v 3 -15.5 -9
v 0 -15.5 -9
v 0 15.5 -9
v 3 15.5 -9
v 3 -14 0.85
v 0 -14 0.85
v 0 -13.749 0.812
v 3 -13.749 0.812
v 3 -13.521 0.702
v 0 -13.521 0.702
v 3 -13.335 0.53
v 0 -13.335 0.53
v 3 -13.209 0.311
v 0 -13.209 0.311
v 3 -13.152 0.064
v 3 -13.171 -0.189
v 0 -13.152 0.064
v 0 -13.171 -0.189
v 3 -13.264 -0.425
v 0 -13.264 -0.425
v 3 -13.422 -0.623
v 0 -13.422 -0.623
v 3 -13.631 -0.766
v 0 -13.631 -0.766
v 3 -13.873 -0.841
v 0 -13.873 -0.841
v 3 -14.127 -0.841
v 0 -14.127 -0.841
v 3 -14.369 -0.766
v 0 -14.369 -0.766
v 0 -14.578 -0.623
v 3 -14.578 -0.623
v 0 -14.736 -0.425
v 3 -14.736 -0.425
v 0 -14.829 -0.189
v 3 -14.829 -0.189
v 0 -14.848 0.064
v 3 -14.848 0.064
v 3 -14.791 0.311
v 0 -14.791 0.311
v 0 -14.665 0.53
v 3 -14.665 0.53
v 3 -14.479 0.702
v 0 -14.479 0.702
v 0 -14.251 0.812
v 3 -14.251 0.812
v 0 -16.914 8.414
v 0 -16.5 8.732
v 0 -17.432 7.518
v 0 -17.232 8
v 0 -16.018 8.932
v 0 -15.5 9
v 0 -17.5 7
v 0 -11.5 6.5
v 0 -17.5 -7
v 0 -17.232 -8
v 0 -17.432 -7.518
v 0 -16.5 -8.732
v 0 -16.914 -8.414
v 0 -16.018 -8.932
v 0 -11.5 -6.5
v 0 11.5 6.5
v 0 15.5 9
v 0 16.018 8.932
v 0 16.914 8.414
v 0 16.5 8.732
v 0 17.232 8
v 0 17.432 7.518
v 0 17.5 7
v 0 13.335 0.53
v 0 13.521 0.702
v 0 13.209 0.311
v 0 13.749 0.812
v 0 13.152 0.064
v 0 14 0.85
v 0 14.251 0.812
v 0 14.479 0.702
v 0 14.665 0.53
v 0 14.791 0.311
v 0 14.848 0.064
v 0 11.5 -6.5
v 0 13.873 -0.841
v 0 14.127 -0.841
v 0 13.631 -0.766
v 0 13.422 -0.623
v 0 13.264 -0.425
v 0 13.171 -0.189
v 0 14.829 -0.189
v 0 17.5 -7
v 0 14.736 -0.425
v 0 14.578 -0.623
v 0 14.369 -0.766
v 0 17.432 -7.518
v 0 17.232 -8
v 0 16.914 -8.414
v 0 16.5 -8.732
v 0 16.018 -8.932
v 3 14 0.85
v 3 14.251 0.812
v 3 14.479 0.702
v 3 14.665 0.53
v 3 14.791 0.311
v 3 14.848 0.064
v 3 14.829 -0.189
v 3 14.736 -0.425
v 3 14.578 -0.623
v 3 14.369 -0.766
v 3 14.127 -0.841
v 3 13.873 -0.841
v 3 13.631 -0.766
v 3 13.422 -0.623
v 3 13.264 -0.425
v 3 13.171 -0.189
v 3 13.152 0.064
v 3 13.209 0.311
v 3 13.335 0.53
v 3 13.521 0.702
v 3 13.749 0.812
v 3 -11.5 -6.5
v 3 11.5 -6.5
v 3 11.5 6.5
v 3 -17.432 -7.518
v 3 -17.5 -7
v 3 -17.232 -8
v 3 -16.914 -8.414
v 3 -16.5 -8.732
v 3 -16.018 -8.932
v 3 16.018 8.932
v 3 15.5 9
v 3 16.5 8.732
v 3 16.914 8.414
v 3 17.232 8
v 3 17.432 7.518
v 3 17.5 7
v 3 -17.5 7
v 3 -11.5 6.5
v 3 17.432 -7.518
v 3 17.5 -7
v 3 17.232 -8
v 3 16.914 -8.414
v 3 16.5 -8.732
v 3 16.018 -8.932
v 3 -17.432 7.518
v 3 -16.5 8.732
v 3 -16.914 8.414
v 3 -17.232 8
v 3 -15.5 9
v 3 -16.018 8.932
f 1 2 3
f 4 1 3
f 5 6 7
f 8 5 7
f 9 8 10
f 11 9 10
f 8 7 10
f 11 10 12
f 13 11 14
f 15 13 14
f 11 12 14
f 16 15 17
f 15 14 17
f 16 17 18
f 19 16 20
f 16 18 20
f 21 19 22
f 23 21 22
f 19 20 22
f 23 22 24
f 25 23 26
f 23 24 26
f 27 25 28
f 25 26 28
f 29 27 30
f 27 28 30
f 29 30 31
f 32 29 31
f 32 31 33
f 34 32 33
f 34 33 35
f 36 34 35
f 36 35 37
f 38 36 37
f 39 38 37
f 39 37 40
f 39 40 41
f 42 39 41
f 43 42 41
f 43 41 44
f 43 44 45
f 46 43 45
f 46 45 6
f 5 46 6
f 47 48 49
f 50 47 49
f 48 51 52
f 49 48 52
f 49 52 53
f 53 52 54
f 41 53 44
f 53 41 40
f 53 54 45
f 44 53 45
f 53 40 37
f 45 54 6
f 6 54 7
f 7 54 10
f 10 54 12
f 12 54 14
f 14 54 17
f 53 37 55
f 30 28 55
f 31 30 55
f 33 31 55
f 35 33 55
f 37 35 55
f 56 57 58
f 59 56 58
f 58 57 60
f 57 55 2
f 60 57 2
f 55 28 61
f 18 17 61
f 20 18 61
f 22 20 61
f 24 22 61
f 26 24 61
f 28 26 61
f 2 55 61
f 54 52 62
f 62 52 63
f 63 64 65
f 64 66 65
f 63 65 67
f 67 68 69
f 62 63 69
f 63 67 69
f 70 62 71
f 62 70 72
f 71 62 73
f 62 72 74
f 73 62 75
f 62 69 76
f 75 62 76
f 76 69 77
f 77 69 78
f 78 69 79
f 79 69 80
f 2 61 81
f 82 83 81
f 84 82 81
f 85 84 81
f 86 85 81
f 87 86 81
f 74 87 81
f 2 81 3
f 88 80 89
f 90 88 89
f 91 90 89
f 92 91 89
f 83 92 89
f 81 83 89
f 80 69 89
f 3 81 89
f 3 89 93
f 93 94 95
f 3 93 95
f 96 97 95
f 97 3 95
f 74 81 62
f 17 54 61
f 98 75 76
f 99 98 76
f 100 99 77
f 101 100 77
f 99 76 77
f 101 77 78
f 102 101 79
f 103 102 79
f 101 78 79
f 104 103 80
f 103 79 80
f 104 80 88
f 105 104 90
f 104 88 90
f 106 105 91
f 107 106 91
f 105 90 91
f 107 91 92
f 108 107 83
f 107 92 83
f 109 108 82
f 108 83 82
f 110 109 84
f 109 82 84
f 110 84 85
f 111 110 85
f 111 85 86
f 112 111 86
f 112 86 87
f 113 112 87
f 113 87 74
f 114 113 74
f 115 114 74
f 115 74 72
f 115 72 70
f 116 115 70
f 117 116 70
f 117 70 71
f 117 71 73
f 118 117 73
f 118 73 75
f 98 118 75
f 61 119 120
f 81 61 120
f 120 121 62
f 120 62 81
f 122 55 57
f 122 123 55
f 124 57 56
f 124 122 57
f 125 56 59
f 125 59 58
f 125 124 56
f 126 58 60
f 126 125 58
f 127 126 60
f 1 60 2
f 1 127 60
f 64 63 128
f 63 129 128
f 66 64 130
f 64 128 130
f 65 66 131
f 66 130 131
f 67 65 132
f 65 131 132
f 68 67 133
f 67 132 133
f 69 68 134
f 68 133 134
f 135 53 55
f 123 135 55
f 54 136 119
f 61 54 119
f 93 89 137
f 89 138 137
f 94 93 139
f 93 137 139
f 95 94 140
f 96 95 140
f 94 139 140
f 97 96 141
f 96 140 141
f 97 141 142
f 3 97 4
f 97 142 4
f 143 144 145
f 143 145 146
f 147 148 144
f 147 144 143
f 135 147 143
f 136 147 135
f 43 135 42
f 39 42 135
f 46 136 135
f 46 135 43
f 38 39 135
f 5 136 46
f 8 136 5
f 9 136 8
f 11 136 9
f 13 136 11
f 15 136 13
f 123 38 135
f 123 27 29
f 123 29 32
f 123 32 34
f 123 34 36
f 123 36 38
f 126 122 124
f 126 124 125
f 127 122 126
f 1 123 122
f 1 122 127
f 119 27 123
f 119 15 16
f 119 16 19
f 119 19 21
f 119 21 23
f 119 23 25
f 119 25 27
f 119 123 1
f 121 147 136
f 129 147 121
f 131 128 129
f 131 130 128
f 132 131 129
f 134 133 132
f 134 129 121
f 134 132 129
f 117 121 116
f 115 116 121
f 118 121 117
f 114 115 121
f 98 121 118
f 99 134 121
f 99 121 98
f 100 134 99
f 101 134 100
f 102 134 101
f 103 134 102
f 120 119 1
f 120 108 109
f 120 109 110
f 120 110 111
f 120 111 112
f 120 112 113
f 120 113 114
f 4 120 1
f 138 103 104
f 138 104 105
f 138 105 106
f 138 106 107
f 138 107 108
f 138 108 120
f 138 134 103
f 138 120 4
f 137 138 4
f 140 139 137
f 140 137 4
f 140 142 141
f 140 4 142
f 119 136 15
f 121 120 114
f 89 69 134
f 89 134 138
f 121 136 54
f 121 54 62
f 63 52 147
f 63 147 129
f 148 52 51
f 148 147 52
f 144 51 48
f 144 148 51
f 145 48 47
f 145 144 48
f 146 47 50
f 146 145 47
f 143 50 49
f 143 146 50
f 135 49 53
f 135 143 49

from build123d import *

# Parameters (mm, degrees)
ESBO_O1_W                = 18
ESBO_O1_H                = 35
RESSALTO_EXTRUS_O1_DEPTH = 3
CORTE_EXTRUS_O1_REACH    = 21.906
ESBO_O2_W                = 13
ESBO_O2_H                = 23
CORTE_EXTRUS_O2_REACH    = 21.906
ESBO_O3_R                = 0.85
FILETE1_R                = 2


with BuildPart() as part:
    # Esboço1 → Ressalto-extrusão1 (new body)
    with BuildSketch(Plane(origin=(0, 0, 0), x_dir=(0, 0, -1), z_dir=(1, 0, 0))):
        Rectangle(ESBO_O1_W, ESBO_O1_H)
    extrude(amount=RESSALTO_EXTRUS_O1_DEPTH)

    # Esboço2 → Corte-extrusão1 (cut, up to next)
    with BuildSketch(Plane(origin=(3, 0, 0), x_dir=(0, 0, -1), z_dir=(1, 0, 0)), mode=Mode.PRIVATE) as corte_extrus_o1_sk1:
        Rectangle(ESBO_O2_W, ESBO_O2_H)
    corte_extrus_o1_tool1 = extrude(corte_extrus_o1_sk1.sketch, amount=-CORTE_EXTRUS_O1_REACH, mode=Mode.PRIVATE) & part.part
    add(corte_extrus_o1_tool1.solids().sort_by_distance((3, 0, 0))[0], mode=Mode.SUBTRACT)

    # Esboço3 → Corte-extrusão2 (cut, up to next)
    with BuildSketch(Plane.ZY, mode=Mode.PRIVATE) as corte_extrus_o2_sk1:
        with Locations((0, 14)):
            Circle(ESBO_O3_R)
    corte_extrus_o2_tool1 = extrude(corte_extrus_o2_sk1.sketch, amount=-CORTE_EXTRUS_O2_REACH, mode=Mode.PRIVATE) & part.part
    # Esboço3 → Corte-extrusão2 (cut, up to next)
    with BuildSketch(Plane.ZY, mode=Mode.PRIVATE) as corte_extrus_o2_sk2:
        with Locations((0, -14)):
            Circle(ESBO_O3_R)
    corte_extrus_o2_tool2 = extrude(corte_extrus_o2_sk2.sketch, amount=-CORTE_EXTRUS_O2_REACH, mode=Mode.PRIVATE) & part.part
    add(corte_extrus_o2_tool1.solids().sort_by_distance((0, 14, 0))[0], mode=Mode.SUBTRACT)
    add(corte_extrus_o2_tool2.solids().sort_by_distance((0, -14, 0))[0], mode=Mode.SUBTRACT)

    # Filete1
    filete1_edges = [part.edges().sort_by_distance(p)[0] for p in [
        (1.5, -17.5, -9),
        (1.5, -17.5, 9),
        (1.5, 17.5, 9),
        (1.5, 17.5, -9),
    ]]
    fillet(filete1_edges, radius=FILETE1_R)


solid = part.part
